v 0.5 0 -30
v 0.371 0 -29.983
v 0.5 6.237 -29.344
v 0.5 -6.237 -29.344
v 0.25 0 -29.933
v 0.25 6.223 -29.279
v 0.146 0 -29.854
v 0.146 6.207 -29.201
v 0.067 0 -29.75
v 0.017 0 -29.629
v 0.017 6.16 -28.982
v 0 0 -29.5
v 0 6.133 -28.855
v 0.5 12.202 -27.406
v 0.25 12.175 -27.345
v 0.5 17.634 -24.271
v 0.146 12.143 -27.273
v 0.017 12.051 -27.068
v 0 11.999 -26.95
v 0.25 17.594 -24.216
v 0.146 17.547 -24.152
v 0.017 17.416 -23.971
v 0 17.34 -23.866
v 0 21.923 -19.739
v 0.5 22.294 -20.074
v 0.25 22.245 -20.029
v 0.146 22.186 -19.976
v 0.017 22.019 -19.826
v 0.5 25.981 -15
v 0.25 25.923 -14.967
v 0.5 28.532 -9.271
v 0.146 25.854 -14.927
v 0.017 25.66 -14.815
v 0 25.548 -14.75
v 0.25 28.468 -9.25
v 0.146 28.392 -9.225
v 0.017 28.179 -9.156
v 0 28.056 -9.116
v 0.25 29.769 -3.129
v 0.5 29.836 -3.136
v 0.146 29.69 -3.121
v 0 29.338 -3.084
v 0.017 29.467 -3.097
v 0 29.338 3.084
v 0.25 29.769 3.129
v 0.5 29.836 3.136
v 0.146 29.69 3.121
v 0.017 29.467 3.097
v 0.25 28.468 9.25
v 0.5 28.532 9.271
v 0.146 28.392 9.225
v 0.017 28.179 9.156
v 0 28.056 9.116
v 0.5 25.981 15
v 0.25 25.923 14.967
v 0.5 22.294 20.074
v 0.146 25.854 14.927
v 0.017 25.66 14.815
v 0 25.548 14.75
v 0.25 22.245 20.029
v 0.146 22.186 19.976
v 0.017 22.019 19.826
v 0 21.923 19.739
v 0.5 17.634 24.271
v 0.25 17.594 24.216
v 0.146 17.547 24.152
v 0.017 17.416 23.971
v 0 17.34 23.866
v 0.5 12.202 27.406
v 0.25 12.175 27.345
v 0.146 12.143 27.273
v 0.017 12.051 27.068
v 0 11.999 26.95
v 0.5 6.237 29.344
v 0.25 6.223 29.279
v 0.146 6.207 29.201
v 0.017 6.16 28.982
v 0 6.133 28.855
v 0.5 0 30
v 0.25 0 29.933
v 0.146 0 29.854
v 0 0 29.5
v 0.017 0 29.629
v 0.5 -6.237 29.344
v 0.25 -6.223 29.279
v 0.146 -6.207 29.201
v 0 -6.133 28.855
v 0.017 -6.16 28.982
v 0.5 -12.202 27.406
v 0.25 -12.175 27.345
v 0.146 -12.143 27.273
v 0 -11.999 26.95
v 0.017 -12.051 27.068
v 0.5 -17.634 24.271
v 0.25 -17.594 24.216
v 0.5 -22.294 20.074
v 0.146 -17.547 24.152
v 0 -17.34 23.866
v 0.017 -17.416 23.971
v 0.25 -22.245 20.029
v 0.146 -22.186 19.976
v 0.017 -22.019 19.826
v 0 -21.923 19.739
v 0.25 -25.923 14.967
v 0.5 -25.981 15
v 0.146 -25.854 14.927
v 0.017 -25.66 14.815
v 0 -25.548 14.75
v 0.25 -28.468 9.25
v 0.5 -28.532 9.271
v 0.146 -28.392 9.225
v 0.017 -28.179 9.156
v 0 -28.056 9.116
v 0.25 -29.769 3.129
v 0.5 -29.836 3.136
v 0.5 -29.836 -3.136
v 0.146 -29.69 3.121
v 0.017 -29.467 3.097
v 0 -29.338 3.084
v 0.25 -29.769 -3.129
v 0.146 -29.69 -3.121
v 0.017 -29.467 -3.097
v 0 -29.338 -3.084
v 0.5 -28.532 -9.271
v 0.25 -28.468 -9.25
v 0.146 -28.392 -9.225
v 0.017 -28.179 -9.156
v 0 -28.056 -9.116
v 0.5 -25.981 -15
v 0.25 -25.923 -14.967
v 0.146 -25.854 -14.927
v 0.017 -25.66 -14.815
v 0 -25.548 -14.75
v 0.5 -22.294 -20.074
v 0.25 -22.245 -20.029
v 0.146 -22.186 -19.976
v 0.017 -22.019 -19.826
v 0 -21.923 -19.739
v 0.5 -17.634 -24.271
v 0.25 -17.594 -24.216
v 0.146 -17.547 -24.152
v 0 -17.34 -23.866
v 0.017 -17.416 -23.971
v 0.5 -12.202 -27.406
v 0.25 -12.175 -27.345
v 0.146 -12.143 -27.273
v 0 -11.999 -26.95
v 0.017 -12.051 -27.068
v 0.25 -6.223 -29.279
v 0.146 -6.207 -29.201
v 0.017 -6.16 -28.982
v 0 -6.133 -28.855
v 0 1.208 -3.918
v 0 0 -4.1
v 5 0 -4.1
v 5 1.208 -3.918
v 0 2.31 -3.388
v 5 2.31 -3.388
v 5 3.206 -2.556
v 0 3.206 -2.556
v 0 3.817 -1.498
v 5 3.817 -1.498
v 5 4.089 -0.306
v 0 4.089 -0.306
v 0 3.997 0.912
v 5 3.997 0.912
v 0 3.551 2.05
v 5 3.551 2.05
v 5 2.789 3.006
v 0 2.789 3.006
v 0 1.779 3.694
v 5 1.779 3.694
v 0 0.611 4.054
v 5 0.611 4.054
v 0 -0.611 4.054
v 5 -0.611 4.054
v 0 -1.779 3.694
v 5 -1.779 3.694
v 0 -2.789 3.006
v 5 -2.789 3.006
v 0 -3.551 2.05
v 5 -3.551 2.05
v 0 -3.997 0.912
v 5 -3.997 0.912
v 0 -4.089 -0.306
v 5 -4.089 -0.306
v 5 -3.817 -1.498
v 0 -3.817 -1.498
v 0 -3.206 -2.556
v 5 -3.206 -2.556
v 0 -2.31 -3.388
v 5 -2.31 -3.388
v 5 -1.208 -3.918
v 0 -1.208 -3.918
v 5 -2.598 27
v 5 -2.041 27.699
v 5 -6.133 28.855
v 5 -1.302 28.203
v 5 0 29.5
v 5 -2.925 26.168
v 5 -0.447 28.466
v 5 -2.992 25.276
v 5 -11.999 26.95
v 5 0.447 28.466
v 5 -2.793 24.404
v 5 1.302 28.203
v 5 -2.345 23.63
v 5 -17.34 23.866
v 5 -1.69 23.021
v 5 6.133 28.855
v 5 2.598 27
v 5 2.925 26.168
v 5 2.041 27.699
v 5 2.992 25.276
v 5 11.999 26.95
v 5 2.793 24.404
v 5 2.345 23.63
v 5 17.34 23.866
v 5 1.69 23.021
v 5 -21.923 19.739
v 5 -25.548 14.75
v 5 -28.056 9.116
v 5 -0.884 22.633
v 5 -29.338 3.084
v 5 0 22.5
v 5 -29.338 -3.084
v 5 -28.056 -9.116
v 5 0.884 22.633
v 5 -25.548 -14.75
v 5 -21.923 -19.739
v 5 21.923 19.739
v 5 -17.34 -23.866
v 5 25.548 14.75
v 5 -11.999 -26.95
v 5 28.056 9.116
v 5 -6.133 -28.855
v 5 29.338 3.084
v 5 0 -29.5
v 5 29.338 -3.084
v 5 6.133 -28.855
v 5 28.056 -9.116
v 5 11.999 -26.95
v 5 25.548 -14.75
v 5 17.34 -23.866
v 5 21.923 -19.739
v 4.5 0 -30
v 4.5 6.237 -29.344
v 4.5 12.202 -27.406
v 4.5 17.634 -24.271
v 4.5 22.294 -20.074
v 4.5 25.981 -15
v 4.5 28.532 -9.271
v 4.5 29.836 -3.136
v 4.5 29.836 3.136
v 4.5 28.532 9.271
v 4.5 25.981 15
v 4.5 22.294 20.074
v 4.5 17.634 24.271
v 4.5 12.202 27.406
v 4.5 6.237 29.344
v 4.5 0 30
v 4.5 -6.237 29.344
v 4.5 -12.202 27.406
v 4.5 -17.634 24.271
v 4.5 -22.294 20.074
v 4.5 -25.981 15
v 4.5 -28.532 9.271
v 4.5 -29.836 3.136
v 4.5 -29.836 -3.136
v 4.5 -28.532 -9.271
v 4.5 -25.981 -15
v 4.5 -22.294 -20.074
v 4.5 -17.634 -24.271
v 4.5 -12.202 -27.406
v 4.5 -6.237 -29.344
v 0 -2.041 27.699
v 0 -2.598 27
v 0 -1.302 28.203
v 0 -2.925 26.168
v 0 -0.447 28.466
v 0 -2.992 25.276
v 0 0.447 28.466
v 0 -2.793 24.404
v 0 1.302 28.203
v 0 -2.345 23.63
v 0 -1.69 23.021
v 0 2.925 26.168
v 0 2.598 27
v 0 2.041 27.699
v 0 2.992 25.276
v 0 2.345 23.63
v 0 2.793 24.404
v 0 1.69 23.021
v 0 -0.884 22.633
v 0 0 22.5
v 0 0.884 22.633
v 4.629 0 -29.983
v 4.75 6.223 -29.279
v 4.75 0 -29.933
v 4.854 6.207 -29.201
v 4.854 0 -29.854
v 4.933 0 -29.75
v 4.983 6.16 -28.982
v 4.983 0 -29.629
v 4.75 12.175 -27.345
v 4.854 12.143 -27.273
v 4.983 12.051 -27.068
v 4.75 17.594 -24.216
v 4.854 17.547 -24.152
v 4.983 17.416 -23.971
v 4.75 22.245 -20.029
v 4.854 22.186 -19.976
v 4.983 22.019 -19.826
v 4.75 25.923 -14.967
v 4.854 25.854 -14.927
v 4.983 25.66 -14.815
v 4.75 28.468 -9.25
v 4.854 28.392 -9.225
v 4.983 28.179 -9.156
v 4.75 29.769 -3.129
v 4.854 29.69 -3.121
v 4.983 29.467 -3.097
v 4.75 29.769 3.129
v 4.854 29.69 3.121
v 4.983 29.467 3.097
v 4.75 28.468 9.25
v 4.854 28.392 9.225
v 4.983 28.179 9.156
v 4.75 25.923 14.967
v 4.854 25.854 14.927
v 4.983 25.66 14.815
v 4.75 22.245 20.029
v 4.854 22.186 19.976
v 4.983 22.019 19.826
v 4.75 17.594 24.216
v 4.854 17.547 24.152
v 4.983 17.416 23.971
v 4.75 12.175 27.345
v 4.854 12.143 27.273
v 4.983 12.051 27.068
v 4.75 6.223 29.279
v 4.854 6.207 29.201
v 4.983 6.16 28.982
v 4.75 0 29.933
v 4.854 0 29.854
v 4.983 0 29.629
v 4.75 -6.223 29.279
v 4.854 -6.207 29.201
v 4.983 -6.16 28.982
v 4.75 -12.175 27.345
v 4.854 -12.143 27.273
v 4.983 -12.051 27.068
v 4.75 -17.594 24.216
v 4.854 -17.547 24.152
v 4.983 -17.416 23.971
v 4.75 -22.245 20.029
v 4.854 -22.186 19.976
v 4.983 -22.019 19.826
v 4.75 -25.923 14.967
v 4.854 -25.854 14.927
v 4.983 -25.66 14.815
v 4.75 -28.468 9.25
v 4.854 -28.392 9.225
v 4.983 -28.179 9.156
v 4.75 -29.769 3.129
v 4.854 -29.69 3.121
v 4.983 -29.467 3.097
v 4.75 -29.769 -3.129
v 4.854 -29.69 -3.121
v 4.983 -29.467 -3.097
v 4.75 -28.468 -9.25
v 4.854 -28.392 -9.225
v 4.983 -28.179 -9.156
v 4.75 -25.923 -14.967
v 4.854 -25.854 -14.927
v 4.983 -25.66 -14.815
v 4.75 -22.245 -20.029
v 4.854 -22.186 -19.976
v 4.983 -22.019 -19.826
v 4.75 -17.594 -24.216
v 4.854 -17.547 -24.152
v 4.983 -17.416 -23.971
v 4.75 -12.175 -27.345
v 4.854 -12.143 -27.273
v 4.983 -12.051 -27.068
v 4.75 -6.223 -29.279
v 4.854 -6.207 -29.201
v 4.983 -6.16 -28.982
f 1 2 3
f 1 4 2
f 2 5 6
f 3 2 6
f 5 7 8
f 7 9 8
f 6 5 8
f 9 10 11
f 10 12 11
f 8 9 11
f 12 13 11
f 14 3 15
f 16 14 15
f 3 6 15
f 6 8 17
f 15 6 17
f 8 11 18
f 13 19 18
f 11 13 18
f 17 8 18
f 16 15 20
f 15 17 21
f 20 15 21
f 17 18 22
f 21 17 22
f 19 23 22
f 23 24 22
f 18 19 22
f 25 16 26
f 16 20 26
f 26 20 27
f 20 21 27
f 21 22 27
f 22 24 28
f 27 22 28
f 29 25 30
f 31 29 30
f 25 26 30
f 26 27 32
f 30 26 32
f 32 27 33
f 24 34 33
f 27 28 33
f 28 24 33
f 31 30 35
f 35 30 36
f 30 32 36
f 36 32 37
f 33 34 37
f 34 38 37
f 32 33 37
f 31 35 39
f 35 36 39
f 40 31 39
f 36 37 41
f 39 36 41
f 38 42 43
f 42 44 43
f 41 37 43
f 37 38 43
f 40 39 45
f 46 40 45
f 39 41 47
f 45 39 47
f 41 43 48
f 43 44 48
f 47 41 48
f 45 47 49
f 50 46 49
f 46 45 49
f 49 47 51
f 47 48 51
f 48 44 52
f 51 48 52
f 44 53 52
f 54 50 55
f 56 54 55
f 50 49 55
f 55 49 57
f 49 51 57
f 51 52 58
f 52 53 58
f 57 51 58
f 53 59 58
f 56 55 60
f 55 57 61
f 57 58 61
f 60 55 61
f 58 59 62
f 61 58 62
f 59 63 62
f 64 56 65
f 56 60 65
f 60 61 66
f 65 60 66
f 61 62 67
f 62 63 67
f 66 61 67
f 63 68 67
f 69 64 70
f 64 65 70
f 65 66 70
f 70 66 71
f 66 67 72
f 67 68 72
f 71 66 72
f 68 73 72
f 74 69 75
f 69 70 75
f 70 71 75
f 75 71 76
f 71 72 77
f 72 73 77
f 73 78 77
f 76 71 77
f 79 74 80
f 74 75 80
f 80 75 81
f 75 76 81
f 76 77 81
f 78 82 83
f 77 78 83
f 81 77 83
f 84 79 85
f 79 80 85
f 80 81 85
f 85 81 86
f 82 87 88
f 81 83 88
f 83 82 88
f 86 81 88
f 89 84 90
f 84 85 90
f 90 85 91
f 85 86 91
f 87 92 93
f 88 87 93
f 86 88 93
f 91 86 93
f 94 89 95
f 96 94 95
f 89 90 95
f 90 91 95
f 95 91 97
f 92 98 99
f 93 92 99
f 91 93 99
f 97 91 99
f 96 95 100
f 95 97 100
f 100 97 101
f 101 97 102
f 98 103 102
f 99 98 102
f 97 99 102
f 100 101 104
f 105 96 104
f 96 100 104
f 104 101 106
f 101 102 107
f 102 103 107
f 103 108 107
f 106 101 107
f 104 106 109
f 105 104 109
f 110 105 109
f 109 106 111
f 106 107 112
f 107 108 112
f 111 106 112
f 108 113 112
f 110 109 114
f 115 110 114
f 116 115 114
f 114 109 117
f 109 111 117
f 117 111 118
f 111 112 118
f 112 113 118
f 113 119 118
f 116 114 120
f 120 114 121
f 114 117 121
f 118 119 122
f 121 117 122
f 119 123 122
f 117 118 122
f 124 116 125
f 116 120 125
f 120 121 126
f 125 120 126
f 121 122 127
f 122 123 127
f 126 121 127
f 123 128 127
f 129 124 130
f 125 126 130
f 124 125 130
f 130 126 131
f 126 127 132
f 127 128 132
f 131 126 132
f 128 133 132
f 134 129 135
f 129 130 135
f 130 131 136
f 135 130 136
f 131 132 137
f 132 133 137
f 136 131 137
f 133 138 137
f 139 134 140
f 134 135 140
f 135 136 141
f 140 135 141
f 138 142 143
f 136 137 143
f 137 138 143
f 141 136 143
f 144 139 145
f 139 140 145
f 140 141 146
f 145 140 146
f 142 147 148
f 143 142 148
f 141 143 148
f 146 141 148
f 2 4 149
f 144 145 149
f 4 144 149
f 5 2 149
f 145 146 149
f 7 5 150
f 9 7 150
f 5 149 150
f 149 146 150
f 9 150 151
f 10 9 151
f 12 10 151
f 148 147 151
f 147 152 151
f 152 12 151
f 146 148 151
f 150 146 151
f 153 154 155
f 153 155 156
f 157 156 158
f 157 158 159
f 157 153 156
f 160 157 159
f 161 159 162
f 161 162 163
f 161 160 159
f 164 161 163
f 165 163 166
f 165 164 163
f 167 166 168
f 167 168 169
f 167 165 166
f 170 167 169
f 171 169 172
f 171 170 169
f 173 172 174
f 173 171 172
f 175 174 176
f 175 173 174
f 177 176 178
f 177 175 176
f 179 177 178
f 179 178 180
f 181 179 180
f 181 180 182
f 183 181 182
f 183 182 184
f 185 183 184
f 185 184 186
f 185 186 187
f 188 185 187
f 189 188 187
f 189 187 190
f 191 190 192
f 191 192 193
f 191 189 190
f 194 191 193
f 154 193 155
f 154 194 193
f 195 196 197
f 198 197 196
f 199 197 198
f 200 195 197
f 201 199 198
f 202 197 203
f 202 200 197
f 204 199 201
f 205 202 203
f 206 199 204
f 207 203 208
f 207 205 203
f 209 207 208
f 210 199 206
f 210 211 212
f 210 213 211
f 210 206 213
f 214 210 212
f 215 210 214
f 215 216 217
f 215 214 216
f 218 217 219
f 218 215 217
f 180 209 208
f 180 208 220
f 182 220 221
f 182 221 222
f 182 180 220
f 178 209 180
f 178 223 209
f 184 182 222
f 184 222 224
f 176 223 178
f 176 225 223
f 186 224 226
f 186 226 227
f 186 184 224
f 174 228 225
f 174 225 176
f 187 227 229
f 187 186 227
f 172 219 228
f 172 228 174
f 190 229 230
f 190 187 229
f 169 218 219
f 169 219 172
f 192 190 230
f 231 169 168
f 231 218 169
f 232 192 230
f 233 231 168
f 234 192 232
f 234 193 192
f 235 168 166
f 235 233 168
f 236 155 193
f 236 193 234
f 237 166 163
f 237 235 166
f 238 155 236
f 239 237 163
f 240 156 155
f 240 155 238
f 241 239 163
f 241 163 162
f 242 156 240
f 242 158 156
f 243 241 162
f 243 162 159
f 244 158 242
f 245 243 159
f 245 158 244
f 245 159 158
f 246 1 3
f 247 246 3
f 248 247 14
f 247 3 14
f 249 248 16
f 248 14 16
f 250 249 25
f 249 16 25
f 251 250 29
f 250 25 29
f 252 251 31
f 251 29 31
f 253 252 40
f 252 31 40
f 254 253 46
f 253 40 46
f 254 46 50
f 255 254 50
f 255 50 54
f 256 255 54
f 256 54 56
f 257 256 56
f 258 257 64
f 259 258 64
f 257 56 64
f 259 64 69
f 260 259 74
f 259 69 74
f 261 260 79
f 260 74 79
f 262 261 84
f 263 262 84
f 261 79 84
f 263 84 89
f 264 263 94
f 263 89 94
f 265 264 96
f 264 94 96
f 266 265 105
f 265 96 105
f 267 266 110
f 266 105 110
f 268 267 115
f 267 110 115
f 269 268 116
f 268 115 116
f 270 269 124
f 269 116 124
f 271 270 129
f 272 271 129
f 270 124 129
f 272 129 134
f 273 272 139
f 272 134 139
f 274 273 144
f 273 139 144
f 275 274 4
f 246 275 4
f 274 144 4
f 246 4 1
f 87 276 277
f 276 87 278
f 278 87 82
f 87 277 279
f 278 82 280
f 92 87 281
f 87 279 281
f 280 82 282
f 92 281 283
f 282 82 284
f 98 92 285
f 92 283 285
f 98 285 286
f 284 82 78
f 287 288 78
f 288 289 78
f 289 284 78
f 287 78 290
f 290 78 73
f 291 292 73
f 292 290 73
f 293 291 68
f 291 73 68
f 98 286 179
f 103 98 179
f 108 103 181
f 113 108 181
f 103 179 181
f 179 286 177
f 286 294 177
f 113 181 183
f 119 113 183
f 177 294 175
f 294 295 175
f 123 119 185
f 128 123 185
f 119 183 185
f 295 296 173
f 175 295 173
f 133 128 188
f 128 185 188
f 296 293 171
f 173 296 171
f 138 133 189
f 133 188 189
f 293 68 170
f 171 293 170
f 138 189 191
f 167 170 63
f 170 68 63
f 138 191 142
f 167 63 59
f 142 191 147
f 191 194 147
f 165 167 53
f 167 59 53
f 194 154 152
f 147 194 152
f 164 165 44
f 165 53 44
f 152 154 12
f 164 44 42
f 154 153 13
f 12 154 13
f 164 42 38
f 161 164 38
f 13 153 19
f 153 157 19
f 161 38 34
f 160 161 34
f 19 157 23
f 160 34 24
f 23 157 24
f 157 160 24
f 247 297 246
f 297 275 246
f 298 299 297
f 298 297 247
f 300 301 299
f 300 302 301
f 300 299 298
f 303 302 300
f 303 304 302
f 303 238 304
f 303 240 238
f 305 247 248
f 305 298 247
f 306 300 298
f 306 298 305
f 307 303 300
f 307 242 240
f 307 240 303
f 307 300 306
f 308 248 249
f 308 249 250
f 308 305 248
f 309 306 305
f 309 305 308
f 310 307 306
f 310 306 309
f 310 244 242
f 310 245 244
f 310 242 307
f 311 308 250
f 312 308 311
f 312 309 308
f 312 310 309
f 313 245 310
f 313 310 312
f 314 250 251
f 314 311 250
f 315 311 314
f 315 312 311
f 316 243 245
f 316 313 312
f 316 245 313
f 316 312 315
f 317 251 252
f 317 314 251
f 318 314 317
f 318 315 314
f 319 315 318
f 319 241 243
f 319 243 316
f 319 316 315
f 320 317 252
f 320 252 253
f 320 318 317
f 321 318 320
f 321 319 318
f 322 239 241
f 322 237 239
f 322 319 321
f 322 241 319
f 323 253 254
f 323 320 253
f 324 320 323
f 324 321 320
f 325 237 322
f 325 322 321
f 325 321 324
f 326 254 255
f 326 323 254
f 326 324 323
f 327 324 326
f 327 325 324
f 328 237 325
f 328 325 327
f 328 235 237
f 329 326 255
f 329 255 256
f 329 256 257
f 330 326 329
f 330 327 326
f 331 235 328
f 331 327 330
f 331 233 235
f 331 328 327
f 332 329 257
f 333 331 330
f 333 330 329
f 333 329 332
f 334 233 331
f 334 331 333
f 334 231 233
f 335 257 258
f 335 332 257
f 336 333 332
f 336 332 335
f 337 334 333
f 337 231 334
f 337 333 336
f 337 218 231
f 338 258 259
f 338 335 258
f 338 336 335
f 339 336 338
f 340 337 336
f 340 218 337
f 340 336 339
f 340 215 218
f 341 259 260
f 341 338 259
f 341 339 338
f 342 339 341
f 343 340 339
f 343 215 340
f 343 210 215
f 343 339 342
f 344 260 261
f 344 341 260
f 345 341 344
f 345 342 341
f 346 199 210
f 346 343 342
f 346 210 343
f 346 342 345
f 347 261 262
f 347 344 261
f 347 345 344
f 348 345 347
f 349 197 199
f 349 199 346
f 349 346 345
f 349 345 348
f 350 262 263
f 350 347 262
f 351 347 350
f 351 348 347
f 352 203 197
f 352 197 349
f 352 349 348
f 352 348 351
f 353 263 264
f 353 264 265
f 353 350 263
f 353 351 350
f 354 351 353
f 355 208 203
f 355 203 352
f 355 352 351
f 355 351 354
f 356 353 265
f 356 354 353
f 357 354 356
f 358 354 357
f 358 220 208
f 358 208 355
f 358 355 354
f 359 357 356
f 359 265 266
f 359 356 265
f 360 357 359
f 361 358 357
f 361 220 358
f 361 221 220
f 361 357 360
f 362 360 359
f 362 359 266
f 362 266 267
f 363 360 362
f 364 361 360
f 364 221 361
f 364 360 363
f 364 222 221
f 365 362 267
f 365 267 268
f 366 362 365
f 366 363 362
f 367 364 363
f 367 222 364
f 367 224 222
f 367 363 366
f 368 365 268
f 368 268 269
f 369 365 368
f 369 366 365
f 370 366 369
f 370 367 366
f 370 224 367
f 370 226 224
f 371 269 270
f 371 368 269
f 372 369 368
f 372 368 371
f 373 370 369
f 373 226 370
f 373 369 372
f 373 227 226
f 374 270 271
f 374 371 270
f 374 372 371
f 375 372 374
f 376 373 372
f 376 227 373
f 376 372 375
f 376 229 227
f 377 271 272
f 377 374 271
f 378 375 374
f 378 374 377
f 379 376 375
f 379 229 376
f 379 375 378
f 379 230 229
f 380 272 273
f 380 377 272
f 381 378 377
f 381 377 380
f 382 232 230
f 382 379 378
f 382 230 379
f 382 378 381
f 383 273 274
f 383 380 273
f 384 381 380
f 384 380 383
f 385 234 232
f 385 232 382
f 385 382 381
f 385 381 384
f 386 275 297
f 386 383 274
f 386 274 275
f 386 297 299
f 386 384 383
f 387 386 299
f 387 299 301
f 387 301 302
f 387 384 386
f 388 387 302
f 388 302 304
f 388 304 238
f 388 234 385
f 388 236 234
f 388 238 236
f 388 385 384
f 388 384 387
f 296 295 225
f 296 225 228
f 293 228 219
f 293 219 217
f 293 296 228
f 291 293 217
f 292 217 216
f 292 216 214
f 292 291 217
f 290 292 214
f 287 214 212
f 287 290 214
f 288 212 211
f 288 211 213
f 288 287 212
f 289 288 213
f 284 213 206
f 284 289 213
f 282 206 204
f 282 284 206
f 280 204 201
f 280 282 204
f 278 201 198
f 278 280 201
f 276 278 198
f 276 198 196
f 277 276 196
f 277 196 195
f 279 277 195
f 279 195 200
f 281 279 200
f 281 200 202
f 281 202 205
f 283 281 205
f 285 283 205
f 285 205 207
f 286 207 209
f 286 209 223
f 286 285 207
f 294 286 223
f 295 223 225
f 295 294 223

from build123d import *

# Parameters (mm, degrees)
SKETCH1_R           = 30
SKETCH1_R_2         = 3
SKETCH1_R_3         = 4.1
BOSS_EXTRUDE1_DEPTH = 5
FILLET1_R           = 0.5


with BuildPart() as part:
    # Sketch1 → Boss-Extrude1 (new body)
    with BuildSketch(Plane(origin=(0, 0, 0), x_dir=(0, 0, -1), z_dir=(1, 0, 0))):
        Circle(SKETCH1_R)
        with Locations((-25.5, 0)):
            Circle(SKETCH1_R_2, mode=Mode.SUBTRACT)
        Circle(SKETCH1_R_3, mode=Mode.SUBTRACT)
    extrude(amount=BOSS_EXTRUDE1_DEPTH)

    # Fillet1
    fillet1_edges = [part.edges().sort_by_distance(p)[0] for p in [
        (0, 0, 30),
        (5, 0, 30),
    ]]
    fillet(fillet1_edges, radius=FILLET1_R)


solid = part.part
